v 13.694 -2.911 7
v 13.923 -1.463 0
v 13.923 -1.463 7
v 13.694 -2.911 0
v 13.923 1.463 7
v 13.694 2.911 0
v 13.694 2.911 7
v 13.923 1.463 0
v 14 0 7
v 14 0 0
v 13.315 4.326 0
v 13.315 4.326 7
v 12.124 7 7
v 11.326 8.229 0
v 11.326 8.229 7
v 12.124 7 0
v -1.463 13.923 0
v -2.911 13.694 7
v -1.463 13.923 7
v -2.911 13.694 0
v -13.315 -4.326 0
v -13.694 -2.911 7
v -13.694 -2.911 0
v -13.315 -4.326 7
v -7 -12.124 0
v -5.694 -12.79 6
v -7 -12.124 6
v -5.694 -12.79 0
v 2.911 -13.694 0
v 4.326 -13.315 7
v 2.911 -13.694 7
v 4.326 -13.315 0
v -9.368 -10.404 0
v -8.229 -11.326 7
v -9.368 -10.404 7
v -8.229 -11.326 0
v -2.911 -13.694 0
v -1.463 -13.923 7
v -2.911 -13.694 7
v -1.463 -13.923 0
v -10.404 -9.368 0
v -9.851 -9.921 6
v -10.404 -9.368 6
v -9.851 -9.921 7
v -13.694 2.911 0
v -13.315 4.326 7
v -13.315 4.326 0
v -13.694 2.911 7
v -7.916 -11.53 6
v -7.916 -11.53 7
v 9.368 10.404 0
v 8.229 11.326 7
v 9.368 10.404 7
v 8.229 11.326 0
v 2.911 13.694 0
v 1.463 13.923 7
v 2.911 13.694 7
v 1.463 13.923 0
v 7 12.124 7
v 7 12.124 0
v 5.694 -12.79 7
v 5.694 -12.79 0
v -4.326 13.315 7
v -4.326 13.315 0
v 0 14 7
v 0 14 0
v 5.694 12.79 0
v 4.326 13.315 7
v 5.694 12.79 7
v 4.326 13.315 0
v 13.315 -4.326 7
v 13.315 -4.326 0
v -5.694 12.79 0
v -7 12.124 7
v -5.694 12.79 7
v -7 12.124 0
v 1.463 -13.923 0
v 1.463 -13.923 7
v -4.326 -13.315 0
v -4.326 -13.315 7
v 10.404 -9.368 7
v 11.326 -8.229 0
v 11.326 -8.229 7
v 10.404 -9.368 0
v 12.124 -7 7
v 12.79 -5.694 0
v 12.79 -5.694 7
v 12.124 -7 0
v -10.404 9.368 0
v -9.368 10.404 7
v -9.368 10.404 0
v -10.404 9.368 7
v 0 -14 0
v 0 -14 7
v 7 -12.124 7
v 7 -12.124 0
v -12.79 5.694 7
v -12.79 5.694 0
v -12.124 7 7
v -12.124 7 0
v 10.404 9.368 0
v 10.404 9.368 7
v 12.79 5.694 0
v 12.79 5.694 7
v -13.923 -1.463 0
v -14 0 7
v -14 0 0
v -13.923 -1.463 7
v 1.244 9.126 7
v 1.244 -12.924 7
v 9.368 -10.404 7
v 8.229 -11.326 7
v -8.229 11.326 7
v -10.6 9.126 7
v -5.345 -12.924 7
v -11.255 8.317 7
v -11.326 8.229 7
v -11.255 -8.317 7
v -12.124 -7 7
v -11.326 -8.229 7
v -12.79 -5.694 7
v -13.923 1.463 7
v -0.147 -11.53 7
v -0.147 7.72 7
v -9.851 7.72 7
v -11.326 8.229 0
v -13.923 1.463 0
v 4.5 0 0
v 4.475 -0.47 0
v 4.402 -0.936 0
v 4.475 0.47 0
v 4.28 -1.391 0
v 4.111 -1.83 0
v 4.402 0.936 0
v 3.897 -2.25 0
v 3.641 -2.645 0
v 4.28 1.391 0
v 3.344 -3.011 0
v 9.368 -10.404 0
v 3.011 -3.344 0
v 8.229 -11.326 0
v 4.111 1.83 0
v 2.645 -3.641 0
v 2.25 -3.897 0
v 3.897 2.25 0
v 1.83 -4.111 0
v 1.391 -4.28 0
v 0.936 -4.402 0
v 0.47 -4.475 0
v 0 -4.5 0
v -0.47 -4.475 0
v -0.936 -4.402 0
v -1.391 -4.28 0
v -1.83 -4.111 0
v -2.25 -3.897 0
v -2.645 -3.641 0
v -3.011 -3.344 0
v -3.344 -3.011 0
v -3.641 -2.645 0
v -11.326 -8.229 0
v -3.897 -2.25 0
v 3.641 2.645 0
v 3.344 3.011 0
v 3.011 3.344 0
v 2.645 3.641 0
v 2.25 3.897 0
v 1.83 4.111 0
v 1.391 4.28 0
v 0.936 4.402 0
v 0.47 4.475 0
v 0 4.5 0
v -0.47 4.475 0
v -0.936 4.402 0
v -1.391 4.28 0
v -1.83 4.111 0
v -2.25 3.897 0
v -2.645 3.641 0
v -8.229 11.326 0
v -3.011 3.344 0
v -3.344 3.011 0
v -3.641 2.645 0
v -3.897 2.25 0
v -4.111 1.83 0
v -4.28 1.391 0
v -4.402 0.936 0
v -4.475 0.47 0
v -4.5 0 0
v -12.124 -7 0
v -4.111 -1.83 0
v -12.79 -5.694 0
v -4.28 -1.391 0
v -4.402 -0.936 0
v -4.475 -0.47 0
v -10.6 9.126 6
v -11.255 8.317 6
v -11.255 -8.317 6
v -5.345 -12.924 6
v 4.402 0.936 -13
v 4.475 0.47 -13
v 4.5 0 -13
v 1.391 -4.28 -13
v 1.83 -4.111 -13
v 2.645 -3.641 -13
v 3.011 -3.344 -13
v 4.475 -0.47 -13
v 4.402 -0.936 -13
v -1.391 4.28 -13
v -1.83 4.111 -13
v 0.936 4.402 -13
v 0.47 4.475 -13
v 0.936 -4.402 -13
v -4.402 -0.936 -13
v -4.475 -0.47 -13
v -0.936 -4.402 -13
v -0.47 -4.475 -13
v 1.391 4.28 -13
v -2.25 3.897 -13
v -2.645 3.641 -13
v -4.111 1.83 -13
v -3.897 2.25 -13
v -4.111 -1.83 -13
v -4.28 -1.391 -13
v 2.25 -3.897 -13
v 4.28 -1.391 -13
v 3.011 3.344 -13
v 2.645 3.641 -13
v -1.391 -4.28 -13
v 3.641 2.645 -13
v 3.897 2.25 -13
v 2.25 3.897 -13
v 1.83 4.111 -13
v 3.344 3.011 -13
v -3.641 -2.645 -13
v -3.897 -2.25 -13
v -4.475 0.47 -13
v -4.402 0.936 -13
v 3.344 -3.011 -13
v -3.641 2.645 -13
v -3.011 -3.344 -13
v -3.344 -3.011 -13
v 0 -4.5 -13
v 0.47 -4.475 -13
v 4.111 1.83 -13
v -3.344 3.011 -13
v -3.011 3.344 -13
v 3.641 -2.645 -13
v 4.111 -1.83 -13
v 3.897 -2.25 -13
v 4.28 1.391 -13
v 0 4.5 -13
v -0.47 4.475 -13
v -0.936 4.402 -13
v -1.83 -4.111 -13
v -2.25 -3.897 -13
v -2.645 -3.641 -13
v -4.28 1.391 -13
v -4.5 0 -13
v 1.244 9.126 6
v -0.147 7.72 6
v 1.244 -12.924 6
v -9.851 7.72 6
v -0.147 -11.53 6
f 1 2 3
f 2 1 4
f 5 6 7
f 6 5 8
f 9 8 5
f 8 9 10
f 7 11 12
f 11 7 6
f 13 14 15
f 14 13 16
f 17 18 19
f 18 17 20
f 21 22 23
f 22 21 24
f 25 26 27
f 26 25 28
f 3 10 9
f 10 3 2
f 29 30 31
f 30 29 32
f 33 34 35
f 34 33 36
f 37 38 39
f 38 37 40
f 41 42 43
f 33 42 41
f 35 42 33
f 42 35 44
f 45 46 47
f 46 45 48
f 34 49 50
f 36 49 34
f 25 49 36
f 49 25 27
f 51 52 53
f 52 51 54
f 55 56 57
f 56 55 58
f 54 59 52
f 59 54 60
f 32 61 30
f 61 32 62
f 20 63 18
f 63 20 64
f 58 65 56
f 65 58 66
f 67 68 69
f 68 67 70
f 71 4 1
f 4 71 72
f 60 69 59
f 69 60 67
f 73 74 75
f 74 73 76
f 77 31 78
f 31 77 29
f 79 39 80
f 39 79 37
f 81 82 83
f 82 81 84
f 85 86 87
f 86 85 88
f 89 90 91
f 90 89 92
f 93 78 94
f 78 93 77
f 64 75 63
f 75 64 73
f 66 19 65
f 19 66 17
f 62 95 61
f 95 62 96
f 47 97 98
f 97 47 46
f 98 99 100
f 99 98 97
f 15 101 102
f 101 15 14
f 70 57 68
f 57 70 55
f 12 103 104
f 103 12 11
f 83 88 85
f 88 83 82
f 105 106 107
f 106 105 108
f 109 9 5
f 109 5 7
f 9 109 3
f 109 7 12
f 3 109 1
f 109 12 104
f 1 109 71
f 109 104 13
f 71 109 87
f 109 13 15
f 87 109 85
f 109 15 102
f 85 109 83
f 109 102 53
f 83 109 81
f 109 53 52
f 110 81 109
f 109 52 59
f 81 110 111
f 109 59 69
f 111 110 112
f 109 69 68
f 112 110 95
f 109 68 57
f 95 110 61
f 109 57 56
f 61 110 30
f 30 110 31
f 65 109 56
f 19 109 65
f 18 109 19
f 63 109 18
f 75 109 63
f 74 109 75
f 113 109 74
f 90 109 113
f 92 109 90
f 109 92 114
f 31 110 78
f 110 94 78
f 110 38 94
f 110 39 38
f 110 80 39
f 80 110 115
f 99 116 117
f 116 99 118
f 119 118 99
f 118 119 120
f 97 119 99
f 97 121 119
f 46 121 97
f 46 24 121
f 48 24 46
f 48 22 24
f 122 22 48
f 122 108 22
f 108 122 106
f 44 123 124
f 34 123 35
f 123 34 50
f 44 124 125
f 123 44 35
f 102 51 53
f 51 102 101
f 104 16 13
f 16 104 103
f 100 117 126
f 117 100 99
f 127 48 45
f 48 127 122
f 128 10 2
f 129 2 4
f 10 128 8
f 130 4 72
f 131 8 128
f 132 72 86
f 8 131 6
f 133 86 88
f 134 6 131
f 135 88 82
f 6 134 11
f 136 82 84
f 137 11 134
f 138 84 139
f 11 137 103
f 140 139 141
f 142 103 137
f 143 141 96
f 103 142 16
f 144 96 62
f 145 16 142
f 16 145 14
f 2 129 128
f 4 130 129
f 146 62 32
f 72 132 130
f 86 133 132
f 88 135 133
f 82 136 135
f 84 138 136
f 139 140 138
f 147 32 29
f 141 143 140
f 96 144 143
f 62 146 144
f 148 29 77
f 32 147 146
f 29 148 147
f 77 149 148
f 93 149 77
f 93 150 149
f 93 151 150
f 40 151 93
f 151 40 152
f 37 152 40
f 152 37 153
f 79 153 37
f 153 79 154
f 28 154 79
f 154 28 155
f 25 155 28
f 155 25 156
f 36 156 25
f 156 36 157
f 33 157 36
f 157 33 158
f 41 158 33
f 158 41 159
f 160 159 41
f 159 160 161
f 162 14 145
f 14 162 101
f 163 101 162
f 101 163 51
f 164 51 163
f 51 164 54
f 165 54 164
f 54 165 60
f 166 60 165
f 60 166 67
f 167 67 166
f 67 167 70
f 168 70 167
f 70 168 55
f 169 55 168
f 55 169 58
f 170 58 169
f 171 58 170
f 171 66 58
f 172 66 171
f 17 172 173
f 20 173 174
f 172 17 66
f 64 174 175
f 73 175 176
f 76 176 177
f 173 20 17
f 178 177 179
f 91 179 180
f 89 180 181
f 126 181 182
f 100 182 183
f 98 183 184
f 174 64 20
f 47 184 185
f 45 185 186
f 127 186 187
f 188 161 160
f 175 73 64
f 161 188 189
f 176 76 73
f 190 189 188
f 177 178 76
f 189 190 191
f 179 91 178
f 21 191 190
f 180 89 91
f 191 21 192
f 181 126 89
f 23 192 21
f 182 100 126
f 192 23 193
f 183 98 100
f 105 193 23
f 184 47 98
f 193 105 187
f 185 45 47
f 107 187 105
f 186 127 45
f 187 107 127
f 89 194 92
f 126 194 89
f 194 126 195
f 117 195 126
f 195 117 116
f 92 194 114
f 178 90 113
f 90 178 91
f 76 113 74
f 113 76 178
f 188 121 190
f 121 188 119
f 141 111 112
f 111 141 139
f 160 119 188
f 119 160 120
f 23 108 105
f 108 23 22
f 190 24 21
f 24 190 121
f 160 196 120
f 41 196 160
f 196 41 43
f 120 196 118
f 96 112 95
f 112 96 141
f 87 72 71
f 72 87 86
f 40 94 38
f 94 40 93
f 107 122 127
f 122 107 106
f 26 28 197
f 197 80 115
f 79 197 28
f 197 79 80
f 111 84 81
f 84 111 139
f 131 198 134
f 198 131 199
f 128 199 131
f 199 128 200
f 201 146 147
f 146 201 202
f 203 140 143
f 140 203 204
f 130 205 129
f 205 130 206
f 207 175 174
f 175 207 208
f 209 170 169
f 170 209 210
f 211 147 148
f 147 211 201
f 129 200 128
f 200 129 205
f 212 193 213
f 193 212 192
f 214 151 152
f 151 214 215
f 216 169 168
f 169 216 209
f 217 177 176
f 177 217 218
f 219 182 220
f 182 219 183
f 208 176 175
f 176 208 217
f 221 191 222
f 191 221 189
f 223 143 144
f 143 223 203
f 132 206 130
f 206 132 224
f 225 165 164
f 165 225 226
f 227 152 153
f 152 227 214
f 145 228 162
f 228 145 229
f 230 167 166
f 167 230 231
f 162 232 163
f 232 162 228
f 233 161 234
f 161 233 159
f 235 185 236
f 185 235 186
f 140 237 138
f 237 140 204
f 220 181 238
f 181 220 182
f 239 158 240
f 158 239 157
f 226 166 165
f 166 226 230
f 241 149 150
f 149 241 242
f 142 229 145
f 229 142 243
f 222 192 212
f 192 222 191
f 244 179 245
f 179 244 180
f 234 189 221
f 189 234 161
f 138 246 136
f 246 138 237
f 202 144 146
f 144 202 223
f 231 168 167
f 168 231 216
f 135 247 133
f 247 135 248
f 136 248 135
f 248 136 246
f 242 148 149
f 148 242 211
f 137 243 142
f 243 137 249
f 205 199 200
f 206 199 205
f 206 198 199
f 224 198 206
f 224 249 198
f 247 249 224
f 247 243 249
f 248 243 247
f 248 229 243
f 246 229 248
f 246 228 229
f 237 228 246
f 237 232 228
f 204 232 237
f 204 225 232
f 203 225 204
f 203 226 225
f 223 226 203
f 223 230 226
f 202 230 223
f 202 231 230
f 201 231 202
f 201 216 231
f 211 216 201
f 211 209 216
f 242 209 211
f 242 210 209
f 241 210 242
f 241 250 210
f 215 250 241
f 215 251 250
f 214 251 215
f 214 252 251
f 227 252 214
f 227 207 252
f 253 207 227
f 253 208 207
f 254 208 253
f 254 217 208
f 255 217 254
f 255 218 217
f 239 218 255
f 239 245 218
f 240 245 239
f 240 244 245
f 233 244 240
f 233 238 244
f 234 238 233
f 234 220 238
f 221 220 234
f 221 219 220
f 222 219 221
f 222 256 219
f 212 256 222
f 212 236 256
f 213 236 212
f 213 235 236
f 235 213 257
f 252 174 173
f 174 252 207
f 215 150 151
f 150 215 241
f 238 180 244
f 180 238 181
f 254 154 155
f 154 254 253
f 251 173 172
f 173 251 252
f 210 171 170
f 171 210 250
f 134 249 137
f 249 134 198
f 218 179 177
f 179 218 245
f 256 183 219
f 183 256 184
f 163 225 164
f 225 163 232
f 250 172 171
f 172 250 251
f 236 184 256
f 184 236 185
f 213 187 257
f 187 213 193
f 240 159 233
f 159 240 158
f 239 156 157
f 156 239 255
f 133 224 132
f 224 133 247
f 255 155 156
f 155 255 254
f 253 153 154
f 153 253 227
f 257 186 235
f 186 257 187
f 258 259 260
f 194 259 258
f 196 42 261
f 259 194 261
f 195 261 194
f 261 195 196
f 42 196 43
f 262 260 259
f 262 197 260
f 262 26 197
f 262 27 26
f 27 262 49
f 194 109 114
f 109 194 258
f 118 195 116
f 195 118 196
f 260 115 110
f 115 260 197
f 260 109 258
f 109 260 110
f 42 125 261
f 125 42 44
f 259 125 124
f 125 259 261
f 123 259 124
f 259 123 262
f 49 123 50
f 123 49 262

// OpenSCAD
$fn=60;

module button(){
  cylinder(h=7,d=28);
  translate([0,0,-13])
  cylinder(h=13,d=9);
}

difference(){
  button();
  translate([-12.5,-8.5,6])
  linear_extrude(1)
  text("\uf1d1", font = "Iosevka Nerd Font", size = 18);
}
